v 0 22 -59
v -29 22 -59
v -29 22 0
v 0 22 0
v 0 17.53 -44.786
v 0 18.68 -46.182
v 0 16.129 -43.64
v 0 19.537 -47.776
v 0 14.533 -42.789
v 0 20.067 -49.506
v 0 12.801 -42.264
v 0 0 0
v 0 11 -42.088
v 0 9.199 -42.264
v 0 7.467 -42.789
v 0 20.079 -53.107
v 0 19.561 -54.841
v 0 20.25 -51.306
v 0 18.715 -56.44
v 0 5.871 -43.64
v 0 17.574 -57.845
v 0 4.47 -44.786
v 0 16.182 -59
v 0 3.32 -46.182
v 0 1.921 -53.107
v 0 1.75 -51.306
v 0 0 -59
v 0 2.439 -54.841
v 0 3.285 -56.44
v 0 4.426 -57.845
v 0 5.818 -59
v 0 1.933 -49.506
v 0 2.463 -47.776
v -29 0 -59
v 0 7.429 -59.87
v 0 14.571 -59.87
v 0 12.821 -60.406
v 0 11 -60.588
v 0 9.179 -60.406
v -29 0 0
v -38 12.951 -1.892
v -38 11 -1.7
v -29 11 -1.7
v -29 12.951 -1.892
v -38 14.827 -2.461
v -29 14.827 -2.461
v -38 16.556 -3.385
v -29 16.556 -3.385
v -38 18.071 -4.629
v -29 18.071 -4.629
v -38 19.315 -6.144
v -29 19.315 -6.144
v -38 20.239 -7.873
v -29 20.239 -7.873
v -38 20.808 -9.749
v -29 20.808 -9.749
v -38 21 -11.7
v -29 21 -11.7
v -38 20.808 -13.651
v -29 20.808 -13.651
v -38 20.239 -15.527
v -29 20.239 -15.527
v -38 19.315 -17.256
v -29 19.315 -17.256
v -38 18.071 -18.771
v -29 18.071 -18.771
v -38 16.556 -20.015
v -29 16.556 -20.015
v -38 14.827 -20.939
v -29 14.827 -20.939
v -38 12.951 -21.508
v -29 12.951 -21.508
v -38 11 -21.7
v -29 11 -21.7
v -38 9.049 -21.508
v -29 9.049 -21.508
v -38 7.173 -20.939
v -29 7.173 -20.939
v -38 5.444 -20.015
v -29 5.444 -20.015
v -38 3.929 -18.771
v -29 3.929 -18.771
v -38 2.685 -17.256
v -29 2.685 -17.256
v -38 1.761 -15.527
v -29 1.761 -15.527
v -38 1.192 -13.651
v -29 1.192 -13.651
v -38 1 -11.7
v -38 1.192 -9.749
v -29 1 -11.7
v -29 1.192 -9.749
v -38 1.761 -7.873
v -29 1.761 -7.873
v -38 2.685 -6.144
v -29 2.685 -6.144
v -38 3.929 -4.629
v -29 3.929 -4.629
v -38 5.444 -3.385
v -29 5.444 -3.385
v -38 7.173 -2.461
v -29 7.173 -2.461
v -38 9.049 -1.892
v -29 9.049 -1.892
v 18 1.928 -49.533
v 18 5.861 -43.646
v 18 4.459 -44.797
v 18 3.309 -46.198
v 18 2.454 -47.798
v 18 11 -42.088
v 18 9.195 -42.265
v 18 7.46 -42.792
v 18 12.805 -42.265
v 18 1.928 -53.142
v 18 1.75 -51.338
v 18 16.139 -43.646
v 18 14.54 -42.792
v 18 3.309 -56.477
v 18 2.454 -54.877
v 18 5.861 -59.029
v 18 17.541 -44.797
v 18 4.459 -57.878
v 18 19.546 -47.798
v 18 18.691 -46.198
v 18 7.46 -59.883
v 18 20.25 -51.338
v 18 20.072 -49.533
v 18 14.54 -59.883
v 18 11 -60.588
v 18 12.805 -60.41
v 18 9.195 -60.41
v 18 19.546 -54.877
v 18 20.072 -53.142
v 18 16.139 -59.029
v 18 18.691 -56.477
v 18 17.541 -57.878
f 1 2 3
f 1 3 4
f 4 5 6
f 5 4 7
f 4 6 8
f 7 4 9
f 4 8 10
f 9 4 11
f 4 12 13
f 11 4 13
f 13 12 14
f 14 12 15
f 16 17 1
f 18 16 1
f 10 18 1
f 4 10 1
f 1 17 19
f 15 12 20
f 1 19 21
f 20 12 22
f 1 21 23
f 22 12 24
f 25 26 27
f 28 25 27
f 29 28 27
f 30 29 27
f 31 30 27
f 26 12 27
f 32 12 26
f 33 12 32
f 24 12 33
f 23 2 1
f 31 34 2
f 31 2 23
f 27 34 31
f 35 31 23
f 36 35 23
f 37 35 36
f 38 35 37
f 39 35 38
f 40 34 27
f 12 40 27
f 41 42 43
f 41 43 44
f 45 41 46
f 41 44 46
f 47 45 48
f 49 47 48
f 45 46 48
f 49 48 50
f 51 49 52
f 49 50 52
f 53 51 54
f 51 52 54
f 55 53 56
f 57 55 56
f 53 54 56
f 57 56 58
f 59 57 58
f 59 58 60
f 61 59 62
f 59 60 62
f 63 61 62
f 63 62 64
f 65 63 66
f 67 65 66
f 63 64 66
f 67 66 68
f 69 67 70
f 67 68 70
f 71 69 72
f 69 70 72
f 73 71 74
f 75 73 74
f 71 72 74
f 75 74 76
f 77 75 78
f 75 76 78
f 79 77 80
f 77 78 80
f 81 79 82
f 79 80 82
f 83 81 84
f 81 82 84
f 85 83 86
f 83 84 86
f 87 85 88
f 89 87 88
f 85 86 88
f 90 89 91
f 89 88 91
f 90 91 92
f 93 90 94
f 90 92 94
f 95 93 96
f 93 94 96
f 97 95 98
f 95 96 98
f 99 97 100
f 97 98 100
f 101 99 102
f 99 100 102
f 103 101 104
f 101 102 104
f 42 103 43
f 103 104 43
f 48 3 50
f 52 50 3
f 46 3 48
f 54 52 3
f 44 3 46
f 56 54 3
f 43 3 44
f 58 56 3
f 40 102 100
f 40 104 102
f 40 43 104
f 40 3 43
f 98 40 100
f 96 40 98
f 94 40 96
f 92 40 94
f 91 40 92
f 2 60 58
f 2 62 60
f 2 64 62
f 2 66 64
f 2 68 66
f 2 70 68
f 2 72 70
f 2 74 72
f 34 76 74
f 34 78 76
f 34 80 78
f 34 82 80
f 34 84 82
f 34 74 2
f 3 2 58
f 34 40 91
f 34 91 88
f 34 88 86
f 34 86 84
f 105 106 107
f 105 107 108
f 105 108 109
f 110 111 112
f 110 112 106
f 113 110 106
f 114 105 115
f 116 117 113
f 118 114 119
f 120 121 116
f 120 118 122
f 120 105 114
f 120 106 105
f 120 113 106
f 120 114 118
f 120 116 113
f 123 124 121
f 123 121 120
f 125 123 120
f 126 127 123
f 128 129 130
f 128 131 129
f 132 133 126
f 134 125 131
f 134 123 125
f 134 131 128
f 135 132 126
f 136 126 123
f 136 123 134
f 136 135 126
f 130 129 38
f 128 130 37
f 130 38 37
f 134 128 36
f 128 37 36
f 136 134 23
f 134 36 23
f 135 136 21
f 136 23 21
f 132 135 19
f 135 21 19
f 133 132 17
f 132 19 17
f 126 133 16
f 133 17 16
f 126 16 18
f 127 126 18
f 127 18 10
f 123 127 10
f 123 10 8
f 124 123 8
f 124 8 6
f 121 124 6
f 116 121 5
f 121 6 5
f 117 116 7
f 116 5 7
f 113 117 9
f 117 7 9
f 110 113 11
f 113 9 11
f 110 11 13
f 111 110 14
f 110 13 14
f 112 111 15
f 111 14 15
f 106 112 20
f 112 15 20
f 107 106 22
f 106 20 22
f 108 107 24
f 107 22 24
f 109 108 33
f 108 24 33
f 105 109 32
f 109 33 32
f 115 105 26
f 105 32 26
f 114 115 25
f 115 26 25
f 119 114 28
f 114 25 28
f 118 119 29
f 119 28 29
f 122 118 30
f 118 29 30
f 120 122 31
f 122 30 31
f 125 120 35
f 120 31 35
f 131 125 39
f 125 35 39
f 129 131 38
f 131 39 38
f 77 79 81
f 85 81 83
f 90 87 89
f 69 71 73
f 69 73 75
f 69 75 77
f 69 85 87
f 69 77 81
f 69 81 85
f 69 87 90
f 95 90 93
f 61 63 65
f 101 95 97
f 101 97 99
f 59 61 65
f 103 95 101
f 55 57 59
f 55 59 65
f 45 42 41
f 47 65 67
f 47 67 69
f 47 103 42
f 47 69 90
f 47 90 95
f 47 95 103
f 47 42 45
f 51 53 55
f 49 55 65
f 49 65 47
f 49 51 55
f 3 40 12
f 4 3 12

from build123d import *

# Parameters (mm, degrees)
SKETCH1_W           = 29
SKETCH1_H           = 59
BOSS_EXTRUDE1_DEPTH = 22
SKETCH4_R           = 9.25
BOSS_EXTRUDE4_DEPTH = 18
SKETCH5_R           = 10
BOSS_EXTRUDE5_DEPTH = 9


with BuildPart() as part:
    # Sketch1 → Boss-Extrude1 (new body)
    with BuildSketch(Plane(origin=(0, 0, 0), x_dir=(1, 0, 0), z_dir=(0, 1, 0))):
        with Locations((-14.5, 29.5)):
            Rectangle(SKETCH1_W, SKETCH1_H)
    extrude(amount=BOSS_EXTRUDE1_DEPTH)

    # Sketch4 → Boss-Extrude4 (add)
    with BuildSketch(Plane(origin=(0, 0, 0), x_dir=(0, 0, -1), z_dir=(1, 0, 0))):
        with Locations((51.3375, 11)):
            Circle(SKETCH4_R)
    extrude(amount=BOSS_EXTRUDE4_DEPTH)

    # Sketch5 → Boss-Extrude5 (add)
    with BuildSketch(Plane.ZY.offset(29)):
        with Locations((-11.7, 11)):
            Circle(SKETCH5_R)
    extrude(amount=BOSS_EXTRUDE5_DEPTH)


solid = part.part
